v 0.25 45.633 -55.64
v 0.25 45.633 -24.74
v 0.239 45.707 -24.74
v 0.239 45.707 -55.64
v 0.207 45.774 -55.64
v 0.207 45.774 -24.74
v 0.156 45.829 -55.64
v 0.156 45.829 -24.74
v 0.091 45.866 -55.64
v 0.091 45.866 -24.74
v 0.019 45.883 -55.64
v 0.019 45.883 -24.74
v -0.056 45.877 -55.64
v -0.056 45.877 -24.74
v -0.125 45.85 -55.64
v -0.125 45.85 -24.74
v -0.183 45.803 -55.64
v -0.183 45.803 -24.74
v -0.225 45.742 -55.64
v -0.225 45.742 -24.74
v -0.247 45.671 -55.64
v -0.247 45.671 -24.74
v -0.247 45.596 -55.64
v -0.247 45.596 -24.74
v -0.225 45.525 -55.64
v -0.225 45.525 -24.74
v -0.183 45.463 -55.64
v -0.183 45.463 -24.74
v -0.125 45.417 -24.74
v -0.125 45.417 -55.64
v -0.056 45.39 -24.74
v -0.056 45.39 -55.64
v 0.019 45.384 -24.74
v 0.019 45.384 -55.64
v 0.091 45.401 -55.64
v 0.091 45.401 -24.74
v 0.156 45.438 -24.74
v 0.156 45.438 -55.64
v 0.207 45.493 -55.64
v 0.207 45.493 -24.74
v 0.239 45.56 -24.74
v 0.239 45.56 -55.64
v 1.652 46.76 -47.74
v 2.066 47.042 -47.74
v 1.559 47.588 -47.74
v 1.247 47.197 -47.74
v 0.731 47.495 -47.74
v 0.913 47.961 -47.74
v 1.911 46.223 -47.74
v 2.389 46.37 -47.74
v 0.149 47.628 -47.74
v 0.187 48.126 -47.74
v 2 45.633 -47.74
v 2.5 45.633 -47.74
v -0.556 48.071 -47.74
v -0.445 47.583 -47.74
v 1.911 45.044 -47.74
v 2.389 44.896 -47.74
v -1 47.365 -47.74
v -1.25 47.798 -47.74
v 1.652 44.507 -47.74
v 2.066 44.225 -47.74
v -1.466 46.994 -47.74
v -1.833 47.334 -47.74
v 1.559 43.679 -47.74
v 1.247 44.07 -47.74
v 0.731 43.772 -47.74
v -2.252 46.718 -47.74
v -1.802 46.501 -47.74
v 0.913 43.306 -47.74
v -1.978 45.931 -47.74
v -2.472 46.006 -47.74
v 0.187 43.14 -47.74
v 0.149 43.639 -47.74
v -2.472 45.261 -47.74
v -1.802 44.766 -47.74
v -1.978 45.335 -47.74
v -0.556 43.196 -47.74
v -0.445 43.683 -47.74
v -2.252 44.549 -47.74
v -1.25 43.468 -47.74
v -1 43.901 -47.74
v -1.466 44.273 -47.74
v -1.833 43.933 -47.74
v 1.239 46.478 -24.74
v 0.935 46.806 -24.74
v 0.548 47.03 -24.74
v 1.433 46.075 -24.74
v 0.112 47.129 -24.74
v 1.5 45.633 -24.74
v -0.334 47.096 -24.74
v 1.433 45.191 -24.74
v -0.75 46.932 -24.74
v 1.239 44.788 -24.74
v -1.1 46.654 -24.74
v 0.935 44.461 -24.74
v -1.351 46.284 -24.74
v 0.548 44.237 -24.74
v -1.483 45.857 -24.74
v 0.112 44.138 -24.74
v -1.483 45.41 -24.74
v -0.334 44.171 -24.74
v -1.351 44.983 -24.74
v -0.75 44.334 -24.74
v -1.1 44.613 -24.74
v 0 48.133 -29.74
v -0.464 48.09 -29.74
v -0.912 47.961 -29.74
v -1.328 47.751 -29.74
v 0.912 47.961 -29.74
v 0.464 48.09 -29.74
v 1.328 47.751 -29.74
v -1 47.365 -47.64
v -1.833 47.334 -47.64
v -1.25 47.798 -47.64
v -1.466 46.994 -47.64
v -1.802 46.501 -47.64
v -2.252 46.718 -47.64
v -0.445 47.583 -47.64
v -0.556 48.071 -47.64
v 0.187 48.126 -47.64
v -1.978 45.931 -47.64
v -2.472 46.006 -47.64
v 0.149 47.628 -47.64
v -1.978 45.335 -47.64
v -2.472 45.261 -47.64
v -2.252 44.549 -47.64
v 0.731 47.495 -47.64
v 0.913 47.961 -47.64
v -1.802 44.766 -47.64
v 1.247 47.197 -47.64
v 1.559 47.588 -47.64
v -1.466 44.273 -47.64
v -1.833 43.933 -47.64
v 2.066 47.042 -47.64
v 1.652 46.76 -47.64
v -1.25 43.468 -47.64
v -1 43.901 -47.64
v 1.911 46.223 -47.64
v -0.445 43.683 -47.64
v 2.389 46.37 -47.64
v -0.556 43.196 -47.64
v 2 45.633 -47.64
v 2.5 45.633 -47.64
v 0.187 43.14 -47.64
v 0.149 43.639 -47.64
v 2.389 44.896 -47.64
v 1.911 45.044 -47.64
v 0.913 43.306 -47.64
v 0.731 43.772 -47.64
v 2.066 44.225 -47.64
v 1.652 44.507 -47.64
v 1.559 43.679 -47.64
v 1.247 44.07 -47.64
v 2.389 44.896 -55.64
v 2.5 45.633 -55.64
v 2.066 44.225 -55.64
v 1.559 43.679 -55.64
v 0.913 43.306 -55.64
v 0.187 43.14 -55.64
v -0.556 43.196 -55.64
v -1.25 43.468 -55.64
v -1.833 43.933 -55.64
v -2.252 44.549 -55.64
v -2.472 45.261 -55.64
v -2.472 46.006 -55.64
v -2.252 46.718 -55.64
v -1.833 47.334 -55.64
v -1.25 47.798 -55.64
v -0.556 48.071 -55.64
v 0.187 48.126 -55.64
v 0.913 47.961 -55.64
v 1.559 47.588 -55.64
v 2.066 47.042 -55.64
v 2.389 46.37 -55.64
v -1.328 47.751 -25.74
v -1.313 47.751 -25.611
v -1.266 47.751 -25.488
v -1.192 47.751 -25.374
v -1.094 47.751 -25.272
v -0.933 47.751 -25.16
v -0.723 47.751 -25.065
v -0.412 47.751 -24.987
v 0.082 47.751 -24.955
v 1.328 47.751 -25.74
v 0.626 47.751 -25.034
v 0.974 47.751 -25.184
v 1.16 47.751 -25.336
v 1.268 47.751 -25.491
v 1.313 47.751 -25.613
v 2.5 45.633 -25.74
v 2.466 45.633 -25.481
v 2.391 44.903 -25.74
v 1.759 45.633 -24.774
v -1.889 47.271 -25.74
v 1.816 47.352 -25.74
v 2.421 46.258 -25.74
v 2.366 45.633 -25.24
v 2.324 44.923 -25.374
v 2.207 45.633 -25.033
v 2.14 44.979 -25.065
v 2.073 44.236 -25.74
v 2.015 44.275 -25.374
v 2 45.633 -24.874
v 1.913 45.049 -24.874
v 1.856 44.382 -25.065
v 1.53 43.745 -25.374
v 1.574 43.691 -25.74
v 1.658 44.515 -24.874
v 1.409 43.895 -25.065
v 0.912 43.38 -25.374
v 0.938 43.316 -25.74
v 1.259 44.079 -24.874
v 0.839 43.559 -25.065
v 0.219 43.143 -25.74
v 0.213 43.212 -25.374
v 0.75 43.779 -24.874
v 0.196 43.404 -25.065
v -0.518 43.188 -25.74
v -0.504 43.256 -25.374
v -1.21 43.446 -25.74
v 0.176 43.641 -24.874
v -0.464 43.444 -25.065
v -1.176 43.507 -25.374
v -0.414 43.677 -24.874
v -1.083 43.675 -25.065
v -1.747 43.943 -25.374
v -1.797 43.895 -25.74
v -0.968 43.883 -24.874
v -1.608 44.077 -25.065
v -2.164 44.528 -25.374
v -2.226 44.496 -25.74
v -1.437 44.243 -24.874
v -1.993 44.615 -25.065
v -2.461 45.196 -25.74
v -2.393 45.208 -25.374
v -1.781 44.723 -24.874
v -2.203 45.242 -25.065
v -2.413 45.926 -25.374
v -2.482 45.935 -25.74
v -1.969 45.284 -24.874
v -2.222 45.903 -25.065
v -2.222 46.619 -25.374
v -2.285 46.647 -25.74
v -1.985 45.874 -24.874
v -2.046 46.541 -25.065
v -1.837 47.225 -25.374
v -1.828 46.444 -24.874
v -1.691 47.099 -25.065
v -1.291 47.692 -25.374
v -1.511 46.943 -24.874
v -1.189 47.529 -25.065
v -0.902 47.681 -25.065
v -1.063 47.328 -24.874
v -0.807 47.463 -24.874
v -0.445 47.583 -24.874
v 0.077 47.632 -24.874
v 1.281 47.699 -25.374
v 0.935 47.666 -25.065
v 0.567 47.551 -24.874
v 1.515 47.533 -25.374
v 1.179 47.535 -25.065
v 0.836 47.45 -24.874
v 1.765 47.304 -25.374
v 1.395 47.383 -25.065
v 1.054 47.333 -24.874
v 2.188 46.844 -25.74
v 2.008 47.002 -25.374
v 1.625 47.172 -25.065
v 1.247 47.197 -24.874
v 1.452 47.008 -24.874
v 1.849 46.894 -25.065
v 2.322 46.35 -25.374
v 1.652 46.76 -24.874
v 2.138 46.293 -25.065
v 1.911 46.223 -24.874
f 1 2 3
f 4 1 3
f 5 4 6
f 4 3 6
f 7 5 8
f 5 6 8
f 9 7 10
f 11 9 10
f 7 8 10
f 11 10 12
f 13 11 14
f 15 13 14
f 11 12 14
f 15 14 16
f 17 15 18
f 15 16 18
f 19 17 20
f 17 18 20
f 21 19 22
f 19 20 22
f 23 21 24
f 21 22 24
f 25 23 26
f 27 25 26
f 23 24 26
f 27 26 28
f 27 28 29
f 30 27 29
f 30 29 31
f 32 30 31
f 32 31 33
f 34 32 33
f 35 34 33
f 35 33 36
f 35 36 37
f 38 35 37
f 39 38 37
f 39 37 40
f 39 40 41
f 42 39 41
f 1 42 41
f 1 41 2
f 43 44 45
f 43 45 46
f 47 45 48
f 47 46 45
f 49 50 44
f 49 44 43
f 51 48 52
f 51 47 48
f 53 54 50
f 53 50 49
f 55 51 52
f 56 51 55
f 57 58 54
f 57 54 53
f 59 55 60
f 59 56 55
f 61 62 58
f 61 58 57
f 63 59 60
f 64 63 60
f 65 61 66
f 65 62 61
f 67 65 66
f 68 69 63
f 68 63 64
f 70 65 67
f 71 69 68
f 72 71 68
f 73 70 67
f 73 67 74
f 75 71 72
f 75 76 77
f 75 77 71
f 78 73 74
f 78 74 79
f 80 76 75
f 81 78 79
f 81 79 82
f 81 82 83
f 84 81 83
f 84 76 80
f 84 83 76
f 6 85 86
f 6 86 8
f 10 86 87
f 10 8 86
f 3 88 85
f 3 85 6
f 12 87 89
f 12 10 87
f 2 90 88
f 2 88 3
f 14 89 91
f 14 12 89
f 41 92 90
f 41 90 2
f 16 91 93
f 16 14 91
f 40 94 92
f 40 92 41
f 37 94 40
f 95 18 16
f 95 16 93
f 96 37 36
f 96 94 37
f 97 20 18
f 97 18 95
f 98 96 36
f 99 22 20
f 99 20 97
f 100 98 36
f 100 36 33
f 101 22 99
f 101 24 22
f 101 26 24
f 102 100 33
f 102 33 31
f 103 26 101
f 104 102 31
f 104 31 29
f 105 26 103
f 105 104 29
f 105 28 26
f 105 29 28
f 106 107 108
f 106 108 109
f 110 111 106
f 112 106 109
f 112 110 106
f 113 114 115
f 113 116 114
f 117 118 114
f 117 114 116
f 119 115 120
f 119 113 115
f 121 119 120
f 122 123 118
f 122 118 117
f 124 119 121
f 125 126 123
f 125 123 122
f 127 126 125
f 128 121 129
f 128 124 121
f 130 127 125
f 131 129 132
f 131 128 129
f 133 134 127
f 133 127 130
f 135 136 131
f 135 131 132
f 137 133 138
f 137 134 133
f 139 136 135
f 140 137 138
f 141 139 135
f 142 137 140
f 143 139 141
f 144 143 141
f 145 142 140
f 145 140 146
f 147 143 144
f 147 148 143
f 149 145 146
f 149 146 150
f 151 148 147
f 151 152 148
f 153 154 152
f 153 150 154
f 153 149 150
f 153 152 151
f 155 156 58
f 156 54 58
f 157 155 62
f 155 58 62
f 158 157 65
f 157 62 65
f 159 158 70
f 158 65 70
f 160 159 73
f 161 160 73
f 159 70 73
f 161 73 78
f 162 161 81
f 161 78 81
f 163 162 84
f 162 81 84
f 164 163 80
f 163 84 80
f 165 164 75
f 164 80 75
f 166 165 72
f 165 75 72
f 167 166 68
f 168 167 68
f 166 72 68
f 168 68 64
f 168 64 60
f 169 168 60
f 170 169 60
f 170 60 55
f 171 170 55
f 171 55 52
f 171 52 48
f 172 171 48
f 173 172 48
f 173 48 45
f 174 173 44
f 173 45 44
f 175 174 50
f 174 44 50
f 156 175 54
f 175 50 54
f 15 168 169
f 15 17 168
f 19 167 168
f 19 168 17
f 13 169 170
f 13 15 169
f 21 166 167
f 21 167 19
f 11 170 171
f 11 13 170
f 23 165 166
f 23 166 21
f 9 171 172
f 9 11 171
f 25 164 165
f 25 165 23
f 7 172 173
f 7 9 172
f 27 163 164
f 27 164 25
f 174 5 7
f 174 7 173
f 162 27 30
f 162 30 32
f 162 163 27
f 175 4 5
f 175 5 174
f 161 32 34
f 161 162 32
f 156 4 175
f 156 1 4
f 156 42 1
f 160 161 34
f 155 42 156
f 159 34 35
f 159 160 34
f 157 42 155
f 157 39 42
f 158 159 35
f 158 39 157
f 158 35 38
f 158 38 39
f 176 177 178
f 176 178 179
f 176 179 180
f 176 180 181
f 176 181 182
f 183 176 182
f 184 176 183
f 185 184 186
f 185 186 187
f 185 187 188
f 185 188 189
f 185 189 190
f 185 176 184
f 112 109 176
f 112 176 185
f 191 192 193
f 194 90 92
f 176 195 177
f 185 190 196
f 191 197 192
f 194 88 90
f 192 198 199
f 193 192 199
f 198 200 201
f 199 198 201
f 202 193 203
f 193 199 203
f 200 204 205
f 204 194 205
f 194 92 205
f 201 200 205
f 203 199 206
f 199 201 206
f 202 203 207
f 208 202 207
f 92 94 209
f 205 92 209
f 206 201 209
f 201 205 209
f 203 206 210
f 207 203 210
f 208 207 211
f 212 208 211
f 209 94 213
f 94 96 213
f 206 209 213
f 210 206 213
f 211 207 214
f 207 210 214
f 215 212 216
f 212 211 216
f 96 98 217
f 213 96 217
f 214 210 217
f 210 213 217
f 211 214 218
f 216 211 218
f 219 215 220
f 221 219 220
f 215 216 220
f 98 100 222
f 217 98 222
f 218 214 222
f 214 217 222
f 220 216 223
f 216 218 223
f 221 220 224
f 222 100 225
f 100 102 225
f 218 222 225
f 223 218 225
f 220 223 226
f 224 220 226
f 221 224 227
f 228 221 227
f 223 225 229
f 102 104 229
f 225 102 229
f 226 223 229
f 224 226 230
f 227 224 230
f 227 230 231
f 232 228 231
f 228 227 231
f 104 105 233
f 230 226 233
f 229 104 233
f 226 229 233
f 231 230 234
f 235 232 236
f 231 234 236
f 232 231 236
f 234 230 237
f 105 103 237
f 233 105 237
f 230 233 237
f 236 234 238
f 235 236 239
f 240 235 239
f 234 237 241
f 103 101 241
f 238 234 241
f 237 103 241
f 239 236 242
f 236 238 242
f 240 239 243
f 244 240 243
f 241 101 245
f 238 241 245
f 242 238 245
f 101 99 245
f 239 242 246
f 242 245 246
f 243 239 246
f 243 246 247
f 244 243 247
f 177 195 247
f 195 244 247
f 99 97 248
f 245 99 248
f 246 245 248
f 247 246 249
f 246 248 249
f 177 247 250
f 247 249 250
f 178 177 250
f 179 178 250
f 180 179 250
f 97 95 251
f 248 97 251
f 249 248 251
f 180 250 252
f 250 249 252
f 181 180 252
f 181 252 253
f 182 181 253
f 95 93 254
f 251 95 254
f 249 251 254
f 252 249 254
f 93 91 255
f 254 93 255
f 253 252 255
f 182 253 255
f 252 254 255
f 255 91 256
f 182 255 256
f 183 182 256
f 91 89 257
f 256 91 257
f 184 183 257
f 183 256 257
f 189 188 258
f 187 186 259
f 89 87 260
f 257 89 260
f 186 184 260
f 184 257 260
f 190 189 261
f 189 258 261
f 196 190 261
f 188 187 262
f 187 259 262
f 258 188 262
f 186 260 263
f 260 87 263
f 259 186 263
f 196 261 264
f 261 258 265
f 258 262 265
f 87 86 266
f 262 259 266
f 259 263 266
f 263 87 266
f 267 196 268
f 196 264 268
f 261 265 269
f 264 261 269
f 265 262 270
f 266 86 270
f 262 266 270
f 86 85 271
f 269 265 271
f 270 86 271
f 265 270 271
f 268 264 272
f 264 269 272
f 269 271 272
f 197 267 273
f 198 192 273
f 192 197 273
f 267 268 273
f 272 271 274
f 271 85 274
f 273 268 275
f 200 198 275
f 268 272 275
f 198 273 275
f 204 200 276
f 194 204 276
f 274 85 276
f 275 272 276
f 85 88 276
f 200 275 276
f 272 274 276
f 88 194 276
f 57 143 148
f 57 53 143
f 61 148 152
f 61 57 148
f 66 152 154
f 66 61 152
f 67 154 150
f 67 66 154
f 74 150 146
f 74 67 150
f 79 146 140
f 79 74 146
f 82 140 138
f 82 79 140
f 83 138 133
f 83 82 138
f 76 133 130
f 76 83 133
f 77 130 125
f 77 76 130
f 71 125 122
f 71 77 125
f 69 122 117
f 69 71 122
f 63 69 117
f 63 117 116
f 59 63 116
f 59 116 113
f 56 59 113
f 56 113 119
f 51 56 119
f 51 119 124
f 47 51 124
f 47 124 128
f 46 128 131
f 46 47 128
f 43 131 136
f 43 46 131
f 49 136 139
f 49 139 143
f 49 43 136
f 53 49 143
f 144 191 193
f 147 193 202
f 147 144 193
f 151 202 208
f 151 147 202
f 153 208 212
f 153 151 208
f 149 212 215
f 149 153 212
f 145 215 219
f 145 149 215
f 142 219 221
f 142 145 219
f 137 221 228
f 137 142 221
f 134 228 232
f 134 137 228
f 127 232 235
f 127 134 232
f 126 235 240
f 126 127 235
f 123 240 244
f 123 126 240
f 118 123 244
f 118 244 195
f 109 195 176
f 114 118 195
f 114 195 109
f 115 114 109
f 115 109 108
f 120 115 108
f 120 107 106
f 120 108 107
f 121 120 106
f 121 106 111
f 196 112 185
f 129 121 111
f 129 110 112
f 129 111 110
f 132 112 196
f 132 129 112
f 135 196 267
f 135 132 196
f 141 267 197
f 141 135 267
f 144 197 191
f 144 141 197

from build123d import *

# Parameters (mm, degrees)
SKETCH3_R          = 0.25
CUT_EXTRUDE1_DEPTH = 50
FILLET1_R          = 1
CUT_EXTRUDE2_START = -5
CUT_EXTRUDE2_DEPTH = 5


with BuildPart() as part:
    # Sketch1 → Revolve1 (revolve)
    with BuildSketch(Plane(origin=(0, 0, 0), x_dir=(0, 0, -1), z_dir=(1, 0, 0)), mode=Mode.PRIVATE) as revolve1_sk:
        Polygon((24.740167046, 48.133333333), (47.640167046, 48.133333333), (47.640167046, 47.633333333), (47.740167046, 47.633333333), (47.740167046, 48.133333333), (50.640167046, 48.133333333), (52.640167046, 48.133333333), (55.640167046, 48.133333333), (55.640167046, 45.633333333), (24.740167046, 45.633333333), align=None)
    revolve(revolve1_sk.sketch.rotate(Axis((0, 45.633333333, -15.940167046), (0, 0, -1)), 90), axis=Axis((0, 45.633333333, -15.940167046), (0, 0, -1)))

    # Sketch3 → Cut-Extrude1 (cut)
    with BuildSketch(Plane.XY.offset(-24.740167046)):
        with Locations((0, 45.633333333)):
            Circle(SKETCH3_R)
    extrude(amount=-CUT_EXTRUDE1_DEPTH, mode=Mode.SUBTRACT)

    # Fillet1
    fillet1_edges = [part.edges().sort_by_distance(p)[0] for p in [
        (-2.5, 45.633333333, -24.740167046),
    ]]
    fillet(fillet1_edges, radius=FILLET1_R)

    # Sketch2 → Cut-Extrude2 (cut)
    with BuildSketch(Plane.XY.offset(-24.740167046).offset(CUT_EXTRUDE2_START)):
        with BuildLine():
            Line((-1.328346703, 47.751232065), (1.328346703, 47.751232065))
            ThreePointArc((1.328346703, 47.751232065), (0.691105336, 48.035909745), (0, 48.133333333))
            ThreePointArc((0, 48.133333333), (-0.691105336, 48.035909745), (-1.328346703, 47.751232065))
        make_face()
    extrude(amount=CUT_EXTRUDE2_DEPTH, mode=Mode.SUBTRACT)


solid = part.part
